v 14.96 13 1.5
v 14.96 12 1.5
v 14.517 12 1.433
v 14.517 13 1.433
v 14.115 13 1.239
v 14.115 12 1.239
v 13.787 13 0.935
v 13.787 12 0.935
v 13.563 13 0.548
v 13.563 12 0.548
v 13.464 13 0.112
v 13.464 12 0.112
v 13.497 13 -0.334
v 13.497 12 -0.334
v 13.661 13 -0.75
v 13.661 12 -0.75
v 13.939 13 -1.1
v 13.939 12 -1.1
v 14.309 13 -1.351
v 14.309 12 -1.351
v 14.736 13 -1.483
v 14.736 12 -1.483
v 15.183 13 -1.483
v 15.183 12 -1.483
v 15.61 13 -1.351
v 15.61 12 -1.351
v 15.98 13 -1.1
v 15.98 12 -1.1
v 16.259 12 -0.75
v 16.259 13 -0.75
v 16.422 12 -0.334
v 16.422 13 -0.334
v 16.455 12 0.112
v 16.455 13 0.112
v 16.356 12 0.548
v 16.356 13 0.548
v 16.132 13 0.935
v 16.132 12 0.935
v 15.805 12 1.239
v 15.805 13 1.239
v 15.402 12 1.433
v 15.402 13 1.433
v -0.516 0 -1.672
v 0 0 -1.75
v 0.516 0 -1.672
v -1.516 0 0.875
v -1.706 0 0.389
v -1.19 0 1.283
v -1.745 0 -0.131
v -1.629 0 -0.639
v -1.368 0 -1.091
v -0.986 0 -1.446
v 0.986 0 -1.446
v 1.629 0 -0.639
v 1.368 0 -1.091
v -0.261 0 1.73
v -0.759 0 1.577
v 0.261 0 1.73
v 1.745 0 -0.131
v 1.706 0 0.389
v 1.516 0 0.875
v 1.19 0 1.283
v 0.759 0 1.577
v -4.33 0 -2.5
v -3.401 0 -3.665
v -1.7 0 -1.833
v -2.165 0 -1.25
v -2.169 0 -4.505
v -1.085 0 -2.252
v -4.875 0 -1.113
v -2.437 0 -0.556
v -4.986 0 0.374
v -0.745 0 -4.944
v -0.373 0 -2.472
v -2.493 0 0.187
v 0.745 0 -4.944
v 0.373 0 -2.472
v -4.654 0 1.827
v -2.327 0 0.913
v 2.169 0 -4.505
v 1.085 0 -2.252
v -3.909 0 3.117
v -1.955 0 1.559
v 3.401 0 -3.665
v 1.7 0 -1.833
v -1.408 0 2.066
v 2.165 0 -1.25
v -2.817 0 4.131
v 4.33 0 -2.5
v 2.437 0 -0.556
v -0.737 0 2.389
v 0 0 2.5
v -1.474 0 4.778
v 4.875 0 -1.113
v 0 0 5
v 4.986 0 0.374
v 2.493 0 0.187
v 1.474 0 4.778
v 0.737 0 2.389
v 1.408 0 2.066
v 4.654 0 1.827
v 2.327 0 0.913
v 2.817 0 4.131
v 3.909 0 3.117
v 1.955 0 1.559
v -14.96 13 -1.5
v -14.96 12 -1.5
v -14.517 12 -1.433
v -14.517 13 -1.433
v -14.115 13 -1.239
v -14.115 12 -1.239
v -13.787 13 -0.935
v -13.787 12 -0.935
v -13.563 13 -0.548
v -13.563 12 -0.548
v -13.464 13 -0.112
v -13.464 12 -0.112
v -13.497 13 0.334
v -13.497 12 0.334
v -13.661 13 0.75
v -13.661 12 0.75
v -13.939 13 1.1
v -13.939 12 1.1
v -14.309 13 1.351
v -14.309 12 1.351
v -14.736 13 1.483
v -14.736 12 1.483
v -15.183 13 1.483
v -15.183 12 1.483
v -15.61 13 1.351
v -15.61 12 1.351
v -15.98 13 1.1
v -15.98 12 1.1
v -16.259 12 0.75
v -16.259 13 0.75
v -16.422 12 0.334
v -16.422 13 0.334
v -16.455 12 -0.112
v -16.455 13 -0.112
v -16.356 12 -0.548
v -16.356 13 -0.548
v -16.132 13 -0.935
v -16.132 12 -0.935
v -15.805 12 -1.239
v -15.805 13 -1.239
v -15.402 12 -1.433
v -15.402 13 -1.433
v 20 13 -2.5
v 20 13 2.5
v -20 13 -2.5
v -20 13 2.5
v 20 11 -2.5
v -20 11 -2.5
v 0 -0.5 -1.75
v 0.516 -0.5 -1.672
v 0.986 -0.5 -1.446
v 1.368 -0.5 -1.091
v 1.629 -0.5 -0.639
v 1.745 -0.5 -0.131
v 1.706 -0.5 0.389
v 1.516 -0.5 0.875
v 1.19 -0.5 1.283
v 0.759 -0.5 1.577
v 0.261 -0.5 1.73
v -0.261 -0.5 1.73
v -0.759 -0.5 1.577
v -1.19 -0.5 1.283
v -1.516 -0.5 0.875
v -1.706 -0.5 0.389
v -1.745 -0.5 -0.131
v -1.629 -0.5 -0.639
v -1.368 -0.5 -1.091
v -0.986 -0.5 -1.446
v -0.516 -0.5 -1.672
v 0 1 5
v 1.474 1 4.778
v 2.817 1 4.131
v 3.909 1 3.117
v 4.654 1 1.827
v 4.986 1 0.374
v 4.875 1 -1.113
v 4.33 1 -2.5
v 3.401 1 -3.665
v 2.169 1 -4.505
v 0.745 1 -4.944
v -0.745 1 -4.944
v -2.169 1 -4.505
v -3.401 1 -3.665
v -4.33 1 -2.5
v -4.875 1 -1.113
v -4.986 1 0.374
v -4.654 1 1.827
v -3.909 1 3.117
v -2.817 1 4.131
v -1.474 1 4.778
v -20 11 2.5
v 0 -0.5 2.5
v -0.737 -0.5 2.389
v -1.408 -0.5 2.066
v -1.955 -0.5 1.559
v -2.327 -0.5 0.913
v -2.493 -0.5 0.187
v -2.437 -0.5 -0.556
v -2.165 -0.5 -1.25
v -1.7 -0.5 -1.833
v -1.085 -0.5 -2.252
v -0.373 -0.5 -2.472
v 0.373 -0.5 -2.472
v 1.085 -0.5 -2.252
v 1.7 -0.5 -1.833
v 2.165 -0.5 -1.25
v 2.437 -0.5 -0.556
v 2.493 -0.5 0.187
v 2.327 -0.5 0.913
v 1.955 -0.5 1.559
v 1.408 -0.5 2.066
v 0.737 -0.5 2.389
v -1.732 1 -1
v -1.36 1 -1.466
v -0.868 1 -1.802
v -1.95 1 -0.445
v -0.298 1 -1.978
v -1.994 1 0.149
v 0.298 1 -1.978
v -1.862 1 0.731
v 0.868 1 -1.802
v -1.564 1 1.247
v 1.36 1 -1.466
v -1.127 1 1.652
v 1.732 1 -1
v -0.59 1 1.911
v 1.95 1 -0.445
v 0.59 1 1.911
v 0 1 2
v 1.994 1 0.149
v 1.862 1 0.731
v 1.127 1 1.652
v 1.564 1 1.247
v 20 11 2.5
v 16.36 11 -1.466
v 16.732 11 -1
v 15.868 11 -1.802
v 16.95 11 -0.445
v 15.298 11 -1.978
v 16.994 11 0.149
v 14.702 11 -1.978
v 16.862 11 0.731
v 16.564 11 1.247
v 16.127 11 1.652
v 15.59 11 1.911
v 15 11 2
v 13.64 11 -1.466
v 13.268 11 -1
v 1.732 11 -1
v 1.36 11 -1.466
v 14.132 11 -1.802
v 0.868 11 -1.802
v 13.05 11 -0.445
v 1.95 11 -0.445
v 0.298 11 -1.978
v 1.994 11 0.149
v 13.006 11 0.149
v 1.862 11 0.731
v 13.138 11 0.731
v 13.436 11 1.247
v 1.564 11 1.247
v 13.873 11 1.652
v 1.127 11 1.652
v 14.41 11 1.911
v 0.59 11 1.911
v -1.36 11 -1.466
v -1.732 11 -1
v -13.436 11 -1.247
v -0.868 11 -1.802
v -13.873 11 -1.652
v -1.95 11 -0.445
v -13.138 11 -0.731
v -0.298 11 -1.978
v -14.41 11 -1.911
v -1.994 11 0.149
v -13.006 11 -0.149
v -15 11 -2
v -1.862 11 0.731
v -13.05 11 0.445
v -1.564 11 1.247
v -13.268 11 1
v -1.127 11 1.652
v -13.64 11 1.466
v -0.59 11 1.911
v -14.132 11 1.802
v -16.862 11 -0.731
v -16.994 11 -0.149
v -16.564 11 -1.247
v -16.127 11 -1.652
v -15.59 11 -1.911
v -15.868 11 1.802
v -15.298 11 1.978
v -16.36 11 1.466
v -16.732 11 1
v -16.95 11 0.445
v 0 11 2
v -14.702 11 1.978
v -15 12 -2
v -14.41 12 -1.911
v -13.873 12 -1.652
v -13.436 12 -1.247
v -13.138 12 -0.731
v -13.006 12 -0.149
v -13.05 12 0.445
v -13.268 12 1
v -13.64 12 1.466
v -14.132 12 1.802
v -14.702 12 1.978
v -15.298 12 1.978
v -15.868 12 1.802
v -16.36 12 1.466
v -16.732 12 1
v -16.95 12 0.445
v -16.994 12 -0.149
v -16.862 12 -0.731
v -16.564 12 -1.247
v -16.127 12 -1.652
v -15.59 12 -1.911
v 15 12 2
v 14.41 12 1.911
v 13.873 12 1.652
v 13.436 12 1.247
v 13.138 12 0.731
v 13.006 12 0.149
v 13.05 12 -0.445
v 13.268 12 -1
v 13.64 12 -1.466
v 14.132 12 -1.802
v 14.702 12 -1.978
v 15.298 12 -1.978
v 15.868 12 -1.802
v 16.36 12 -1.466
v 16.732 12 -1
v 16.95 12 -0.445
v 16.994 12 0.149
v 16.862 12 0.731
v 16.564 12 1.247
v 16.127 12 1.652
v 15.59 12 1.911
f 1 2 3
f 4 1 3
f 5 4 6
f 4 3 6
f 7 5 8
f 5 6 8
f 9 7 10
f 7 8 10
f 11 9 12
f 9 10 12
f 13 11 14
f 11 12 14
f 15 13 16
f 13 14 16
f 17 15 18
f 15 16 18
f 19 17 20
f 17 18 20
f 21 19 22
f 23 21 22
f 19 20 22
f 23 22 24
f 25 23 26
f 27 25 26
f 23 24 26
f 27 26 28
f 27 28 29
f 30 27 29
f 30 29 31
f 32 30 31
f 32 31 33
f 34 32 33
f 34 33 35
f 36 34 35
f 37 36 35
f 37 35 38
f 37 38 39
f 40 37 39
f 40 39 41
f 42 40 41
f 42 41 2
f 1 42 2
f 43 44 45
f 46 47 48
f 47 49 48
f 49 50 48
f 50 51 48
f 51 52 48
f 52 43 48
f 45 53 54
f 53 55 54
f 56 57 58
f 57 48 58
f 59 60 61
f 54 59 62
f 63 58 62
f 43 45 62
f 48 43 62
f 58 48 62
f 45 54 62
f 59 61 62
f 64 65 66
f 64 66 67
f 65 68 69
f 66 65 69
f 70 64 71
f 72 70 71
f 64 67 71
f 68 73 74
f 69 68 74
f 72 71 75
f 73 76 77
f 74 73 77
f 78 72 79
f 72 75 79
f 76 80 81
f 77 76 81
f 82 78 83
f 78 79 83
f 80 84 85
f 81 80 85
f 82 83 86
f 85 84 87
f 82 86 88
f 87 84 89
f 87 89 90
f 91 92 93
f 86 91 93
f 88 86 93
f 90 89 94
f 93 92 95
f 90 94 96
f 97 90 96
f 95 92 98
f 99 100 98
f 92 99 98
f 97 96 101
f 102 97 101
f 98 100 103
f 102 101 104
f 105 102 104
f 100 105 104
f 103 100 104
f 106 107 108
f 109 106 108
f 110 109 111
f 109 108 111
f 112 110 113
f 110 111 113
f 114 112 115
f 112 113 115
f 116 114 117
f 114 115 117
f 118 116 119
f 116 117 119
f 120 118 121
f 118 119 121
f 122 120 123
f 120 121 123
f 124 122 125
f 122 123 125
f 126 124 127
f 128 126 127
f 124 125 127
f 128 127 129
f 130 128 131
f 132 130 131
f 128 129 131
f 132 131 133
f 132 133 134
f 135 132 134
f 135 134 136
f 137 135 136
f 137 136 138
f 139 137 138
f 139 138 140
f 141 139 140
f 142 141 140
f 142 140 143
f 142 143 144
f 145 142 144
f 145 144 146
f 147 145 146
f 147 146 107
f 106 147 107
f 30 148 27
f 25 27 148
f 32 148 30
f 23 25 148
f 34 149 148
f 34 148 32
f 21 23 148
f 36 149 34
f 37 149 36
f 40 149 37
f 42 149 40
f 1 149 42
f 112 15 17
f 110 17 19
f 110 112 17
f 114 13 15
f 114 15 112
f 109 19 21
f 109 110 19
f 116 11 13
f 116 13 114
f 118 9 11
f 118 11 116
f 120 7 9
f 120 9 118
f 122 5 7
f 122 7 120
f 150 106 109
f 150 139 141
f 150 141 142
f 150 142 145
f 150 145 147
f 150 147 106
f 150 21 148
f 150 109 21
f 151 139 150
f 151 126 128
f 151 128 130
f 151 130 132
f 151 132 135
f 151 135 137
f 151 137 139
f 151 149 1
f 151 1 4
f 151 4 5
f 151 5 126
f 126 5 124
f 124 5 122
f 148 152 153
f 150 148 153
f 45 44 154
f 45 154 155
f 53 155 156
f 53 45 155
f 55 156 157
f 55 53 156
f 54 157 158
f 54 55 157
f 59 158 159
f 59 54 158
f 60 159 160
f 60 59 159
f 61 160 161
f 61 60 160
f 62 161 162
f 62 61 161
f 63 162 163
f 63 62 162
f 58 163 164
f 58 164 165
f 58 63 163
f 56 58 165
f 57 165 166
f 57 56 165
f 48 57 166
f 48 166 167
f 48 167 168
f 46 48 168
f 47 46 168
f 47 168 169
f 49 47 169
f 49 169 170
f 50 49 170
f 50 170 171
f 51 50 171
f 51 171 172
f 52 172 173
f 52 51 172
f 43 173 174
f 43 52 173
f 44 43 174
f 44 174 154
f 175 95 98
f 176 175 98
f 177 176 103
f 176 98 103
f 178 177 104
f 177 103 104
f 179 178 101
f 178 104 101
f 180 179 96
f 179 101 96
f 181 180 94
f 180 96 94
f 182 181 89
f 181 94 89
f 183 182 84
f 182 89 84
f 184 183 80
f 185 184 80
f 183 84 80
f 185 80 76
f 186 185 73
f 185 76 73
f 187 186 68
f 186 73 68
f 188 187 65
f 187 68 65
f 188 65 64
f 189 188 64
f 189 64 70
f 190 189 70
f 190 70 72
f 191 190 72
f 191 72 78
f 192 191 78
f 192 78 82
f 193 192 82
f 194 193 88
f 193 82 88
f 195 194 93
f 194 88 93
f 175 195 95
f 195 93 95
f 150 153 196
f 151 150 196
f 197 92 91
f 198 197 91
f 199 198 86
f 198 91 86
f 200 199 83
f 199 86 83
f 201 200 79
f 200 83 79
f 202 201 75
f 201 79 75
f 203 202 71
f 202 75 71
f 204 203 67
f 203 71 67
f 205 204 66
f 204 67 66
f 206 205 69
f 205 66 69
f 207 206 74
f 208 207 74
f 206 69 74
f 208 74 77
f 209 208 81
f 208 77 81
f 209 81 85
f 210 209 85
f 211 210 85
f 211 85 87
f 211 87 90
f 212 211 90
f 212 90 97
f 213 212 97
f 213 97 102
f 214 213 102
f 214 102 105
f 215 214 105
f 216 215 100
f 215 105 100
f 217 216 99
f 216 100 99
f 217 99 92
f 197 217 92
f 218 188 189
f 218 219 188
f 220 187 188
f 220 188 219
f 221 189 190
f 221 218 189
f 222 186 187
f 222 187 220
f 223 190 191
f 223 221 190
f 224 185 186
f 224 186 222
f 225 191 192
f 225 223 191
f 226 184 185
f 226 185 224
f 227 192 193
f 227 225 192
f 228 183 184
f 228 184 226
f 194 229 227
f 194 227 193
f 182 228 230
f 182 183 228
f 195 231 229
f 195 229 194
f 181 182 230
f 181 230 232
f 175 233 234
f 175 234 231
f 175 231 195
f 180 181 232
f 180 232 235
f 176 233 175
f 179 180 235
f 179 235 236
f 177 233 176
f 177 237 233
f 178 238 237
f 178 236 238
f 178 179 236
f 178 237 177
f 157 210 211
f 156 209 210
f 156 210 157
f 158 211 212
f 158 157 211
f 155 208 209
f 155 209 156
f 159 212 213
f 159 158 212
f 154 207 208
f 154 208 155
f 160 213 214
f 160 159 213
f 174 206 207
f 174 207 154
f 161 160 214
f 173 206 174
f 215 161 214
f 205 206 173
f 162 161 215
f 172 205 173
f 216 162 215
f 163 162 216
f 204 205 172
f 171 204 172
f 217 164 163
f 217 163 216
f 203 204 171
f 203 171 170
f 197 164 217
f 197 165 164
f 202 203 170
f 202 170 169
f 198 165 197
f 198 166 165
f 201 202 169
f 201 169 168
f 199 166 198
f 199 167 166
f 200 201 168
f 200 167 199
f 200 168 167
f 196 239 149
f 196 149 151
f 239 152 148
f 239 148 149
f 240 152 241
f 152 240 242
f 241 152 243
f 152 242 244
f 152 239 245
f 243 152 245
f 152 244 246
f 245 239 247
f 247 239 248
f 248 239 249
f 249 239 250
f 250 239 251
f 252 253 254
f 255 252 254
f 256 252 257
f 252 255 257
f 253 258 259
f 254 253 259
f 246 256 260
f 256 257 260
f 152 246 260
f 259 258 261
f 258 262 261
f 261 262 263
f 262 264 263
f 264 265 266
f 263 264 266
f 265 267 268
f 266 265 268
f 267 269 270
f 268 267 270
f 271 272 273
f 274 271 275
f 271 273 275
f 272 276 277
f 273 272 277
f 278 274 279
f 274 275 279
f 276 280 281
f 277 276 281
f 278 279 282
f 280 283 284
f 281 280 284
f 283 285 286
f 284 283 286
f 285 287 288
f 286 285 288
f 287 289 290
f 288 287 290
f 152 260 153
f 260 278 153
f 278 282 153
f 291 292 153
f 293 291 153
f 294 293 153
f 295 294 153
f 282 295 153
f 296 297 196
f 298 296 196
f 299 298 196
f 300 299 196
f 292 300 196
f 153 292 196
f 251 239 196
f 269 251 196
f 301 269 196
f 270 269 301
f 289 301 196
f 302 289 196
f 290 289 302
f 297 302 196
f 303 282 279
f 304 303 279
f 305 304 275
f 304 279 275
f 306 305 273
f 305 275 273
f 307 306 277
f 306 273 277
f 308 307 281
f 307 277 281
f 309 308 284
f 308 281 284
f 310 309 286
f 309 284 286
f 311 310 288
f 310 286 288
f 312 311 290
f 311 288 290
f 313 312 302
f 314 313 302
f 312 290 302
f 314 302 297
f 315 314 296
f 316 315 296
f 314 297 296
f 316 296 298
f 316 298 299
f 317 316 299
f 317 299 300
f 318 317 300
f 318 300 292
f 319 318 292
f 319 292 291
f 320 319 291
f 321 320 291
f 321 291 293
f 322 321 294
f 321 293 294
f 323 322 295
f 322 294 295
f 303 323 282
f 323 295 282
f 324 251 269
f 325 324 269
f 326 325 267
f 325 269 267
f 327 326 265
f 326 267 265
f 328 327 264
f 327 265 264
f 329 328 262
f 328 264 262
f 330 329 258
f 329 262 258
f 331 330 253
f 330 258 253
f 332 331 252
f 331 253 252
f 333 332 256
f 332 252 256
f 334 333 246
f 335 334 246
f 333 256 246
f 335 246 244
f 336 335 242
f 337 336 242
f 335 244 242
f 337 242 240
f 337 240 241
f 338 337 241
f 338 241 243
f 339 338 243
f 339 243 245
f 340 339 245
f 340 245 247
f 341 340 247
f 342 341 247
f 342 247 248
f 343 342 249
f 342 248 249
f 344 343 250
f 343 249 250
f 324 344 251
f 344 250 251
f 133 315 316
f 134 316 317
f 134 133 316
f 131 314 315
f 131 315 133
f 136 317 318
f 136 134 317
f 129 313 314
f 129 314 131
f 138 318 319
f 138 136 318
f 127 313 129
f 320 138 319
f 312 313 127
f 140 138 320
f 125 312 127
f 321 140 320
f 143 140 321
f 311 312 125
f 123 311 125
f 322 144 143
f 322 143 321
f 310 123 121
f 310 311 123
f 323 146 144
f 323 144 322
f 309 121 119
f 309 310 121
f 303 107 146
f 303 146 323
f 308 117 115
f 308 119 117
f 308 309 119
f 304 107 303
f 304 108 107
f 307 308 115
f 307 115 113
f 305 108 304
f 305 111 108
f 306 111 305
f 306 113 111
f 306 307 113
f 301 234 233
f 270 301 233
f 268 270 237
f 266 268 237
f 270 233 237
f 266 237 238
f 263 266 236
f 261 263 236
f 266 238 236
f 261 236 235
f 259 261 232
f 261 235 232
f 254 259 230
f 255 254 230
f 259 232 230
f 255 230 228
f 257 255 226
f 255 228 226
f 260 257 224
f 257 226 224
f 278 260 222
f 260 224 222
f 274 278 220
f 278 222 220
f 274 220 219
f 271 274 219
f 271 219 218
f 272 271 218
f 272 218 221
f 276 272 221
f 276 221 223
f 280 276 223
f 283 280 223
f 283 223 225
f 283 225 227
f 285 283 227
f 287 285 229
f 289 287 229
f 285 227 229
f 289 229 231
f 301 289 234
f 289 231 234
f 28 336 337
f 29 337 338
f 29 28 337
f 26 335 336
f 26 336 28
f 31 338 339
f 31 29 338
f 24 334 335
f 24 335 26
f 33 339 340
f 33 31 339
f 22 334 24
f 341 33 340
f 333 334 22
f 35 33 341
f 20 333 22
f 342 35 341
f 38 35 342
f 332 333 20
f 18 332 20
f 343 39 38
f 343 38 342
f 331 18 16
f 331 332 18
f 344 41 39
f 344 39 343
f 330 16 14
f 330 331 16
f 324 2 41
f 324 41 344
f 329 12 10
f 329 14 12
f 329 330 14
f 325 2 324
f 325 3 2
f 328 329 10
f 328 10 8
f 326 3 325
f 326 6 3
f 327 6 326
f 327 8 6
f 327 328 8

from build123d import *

# Parameters (mm, degrees)
SKETCH2_R           = 5
BOSS_EXTRUDE1_DEPTH = 1
SKETCH3_R           = 2.5
SKETCH3_R_2         = 1.75
BOSS_EXTRUDE2_DEPTH = 0.5
SKETCH4_R           = 2
BOSS_EXTRUDE3_DEPTH = 10
SKETCH6_W           = 40
SKETCH6_H           = 5
BOSS_EXTRUDE4_DEPTH = 2
SKETCH9_R           = 2
CUT_EXTRUDE1_DEPTH  = 1
SKETCH10_R          = 1.5
CUT_EXTRUDE2_DEPTH  = 31


with BuildPart() as part:
    # Sketch2 → Boss-Extrude1 (new body)
    with BuildSketch(Plane(origin=(0, 0, 0), x_dir=(-1, 0, 0), z_dir=(0, 1, 0))):
        with Locations(Location((0, 0, 0), (0, 0, 90))):
            Circle(SKETCH2_R)
    extrude(amount=BOSS_EXTRUDE1_DEPTH)

    # Sketch3 → Boss-Extrude2 (add)
    with BuildSketch(Plane.XZ):
        with Locations(Location((0, 0, 0), (0, 0, 90))):
            Circle(SKETCH3_R)
        with Locations(Location((0, 0, 0), (0, 0, 270))):
            Circle(SKETCH3_R_2, mode=Mode.SUBTRACT)
    extrude(amount=BOSS_EXTRUDE2_DEPTH)

    # Sketch4 → Boss-Extrude3 (add)
    with BuildSketch(Plane(origin=(0, 1, 0), x_dir=(-1, 0, 0), z_dir=(0, 1, 0))):
        with Locations(Location((0, 0, 0), (0, 0, 90))):
            Circle(SKETCH4_R)
    extrude(amount=BOSS_EXTRUDE3_DEPTH)

    # Sketch6 → Boss-Extrude4 (add)
    with BuildSketch(Plane(origin=(0, 11, 0), x_dir=(-1, 0, 0), z_dir=(0, 1, 0))):
        Rectangle(SKETCH6_W, SKETCH6_H)
    extrude(amount=BOSS_EXTRUDE4_DEPTH)

    # Sketch9 → Cut-Extrude1 (cut)
    with BuildSketch(Plane.XZ.offset(-11)):
        with Locations(Location((-15, 0, 0), (0, 0, 270))):
            Circle(SKETCH9_R)
        with Locations(Location((15, 0, 0), (0, 0, 90))):
            Circle(SKETCH9_R)
    extrude(amount=-CUT_EXTRUDE1_DEPTH, mode=Mode.SUBTRACT)

    # Sketch10 → Cut-Extrude2 (cut)
    with BuildSketch(Plane.XZ.offset(-12)):
        with Locations(Location((-14.9595974, 0, 0), (0, 0, 270))):
            Circle(SKETCH10_R)
        with Locations(Location((14.9595974, 0, 0), (0, 0, 90))):
            Circle(SKETCH10_R)
    extrude(amount=-CUT_EXTRUDE2_DEPTH, mode=Mode.SUBTRACT)


solid = part.part
